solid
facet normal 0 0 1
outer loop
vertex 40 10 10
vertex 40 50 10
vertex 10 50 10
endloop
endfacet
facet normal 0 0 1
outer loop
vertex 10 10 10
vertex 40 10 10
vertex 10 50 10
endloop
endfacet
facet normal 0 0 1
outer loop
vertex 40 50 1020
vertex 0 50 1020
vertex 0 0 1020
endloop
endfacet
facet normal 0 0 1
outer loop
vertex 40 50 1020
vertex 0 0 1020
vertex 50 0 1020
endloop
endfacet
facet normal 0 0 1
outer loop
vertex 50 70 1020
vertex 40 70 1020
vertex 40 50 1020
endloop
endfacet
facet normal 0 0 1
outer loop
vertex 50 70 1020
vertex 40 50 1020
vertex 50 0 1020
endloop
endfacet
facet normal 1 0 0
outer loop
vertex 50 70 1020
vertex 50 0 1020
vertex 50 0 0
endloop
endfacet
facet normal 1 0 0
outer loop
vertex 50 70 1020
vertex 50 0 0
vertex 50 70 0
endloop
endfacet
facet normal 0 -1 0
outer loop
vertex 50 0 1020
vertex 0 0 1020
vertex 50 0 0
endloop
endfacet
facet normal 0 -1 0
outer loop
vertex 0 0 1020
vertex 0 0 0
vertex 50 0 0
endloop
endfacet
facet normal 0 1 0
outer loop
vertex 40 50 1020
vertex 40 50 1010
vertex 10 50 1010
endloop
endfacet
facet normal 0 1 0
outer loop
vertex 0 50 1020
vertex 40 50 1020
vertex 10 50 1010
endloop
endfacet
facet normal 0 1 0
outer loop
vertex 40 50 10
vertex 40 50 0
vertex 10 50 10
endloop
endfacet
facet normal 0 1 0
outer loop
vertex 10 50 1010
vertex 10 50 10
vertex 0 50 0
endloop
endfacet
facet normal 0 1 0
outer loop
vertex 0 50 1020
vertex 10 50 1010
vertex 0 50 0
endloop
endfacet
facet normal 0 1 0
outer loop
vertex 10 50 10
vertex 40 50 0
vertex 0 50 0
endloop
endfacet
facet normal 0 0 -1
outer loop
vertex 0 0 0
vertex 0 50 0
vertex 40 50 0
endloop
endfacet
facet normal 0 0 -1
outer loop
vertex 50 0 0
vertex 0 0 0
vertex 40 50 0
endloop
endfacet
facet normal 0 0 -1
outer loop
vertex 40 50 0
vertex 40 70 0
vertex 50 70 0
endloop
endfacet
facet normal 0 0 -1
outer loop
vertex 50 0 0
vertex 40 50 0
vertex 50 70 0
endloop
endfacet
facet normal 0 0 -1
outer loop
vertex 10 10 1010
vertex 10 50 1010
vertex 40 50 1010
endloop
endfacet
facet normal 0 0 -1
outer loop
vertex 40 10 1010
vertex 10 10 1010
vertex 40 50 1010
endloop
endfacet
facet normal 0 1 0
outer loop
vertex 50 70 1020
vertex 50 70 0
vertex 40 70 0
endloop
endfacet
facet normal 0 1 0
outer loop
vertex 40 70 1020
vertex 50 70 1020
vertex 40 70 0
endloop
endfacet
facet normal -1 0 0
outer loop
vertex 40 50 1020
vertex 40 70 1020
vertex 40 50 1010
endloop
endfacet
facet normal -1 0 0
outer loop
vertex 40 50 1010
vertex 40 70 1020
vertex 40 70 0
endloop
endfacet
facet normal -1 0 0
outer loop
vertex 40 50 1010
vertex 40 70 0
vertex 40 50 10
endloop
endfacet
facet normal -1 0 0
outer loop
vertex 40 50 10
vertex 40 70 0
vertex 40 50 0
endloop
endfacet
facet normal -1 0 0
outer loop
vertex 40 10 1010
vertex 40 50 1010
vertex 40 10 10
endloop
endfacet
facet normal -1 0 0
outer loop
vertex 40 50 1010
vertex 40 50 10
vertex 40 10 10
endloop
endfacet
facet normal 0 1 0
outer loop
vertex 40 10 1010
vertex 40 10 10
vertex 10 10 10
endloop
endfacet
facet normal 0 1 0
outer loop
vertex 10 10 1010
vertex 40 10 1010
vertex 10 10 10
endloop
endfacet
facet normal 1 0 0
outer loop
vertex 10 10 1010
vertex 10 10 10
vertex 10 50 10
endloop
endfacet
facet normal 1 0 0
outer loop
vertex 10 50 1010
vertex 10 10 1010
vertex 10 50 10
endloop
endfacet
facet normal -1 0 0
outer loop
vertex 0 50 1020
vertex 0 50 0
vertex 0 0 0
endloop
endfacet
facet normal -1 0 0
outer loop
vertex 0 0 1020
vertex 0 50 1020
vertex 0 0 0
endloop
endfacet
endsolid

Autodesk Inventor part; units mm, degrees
ref_plane "YZ Plane" through (0, 0, 0) normal (1, 0, 0) x (0, 1, 0)
ref_plane "XZ Plane" through (0, 0, 0) normal (0, 1, 0) x (-1, 0, 0)
ref_plane "XY Plane" through (0, 0, 0) normal (0, 0, 1) x (1, 0, 0)
sketch "Esboço1" plane through (0, 0, 0) normal (0, 0, 1) x (1, 0, 0)
  line L0 (0, 0) -> (50, 0)
  line L1 (50, 0) -> (50, 70)
  line L2 (50, 70) -> (40, 70)
  line L3 (40, 70) -> (40, 10)
  line L4 (40, 10) -> (10, 10)
  line L5 (10, 10) -> (10, 50)
  line L6 (10, 50) -> (0, 50)
  line L7 (0, 50) -> (0, 0)
  dimension "d0" = 10
  dimension "d1" = 10
  dimension "d2" = 10
  dimension "d3" = 50
  dimension "d4" = 50
  dimension "d5" = 70
extrude "Extrusão1" add sketch "Esboço1" along normal blind 1020
sketch "Esboço2" plane through (0, 0, 1020) normal (0, 0, 1) x (1, 0, 0)
  line L0 (0, 0) -> (50, 0) projected
  line L1 (0, 0) -> (50, 0)
  line L2 (50, 0) -> (50, 50)
  line L3 (50, 50) -> (0, 50)
  line L4 (10, 10) -> (10, 50) projected
  line L5 (0, 50) -> (0, 0) projected
  line L6 (0, 50) -> (0, 0)
extrude "Extrusão2" add sketch "Esboço2" against normal blind 10
sketch "Esboço3" plane through (0, 0, 0) normal (0, 0, -1) x (-1, 0, 0)
  line L0 (0, 0) -> (-50, 0) projected
  line L1 (-40, 50) -> (0, 50) projected
  line L2 (-50, 0) -> (0, 0)
  line L3 (0, 0) -> (0, 50)
  line L4 (0, 50) -> (-50, 50)
  line L5 (-50, 50) -> (-50, 0)
extrude "Extrusão3" add sketch "Esboço3" against normal blind 10
properties part number "calha"
